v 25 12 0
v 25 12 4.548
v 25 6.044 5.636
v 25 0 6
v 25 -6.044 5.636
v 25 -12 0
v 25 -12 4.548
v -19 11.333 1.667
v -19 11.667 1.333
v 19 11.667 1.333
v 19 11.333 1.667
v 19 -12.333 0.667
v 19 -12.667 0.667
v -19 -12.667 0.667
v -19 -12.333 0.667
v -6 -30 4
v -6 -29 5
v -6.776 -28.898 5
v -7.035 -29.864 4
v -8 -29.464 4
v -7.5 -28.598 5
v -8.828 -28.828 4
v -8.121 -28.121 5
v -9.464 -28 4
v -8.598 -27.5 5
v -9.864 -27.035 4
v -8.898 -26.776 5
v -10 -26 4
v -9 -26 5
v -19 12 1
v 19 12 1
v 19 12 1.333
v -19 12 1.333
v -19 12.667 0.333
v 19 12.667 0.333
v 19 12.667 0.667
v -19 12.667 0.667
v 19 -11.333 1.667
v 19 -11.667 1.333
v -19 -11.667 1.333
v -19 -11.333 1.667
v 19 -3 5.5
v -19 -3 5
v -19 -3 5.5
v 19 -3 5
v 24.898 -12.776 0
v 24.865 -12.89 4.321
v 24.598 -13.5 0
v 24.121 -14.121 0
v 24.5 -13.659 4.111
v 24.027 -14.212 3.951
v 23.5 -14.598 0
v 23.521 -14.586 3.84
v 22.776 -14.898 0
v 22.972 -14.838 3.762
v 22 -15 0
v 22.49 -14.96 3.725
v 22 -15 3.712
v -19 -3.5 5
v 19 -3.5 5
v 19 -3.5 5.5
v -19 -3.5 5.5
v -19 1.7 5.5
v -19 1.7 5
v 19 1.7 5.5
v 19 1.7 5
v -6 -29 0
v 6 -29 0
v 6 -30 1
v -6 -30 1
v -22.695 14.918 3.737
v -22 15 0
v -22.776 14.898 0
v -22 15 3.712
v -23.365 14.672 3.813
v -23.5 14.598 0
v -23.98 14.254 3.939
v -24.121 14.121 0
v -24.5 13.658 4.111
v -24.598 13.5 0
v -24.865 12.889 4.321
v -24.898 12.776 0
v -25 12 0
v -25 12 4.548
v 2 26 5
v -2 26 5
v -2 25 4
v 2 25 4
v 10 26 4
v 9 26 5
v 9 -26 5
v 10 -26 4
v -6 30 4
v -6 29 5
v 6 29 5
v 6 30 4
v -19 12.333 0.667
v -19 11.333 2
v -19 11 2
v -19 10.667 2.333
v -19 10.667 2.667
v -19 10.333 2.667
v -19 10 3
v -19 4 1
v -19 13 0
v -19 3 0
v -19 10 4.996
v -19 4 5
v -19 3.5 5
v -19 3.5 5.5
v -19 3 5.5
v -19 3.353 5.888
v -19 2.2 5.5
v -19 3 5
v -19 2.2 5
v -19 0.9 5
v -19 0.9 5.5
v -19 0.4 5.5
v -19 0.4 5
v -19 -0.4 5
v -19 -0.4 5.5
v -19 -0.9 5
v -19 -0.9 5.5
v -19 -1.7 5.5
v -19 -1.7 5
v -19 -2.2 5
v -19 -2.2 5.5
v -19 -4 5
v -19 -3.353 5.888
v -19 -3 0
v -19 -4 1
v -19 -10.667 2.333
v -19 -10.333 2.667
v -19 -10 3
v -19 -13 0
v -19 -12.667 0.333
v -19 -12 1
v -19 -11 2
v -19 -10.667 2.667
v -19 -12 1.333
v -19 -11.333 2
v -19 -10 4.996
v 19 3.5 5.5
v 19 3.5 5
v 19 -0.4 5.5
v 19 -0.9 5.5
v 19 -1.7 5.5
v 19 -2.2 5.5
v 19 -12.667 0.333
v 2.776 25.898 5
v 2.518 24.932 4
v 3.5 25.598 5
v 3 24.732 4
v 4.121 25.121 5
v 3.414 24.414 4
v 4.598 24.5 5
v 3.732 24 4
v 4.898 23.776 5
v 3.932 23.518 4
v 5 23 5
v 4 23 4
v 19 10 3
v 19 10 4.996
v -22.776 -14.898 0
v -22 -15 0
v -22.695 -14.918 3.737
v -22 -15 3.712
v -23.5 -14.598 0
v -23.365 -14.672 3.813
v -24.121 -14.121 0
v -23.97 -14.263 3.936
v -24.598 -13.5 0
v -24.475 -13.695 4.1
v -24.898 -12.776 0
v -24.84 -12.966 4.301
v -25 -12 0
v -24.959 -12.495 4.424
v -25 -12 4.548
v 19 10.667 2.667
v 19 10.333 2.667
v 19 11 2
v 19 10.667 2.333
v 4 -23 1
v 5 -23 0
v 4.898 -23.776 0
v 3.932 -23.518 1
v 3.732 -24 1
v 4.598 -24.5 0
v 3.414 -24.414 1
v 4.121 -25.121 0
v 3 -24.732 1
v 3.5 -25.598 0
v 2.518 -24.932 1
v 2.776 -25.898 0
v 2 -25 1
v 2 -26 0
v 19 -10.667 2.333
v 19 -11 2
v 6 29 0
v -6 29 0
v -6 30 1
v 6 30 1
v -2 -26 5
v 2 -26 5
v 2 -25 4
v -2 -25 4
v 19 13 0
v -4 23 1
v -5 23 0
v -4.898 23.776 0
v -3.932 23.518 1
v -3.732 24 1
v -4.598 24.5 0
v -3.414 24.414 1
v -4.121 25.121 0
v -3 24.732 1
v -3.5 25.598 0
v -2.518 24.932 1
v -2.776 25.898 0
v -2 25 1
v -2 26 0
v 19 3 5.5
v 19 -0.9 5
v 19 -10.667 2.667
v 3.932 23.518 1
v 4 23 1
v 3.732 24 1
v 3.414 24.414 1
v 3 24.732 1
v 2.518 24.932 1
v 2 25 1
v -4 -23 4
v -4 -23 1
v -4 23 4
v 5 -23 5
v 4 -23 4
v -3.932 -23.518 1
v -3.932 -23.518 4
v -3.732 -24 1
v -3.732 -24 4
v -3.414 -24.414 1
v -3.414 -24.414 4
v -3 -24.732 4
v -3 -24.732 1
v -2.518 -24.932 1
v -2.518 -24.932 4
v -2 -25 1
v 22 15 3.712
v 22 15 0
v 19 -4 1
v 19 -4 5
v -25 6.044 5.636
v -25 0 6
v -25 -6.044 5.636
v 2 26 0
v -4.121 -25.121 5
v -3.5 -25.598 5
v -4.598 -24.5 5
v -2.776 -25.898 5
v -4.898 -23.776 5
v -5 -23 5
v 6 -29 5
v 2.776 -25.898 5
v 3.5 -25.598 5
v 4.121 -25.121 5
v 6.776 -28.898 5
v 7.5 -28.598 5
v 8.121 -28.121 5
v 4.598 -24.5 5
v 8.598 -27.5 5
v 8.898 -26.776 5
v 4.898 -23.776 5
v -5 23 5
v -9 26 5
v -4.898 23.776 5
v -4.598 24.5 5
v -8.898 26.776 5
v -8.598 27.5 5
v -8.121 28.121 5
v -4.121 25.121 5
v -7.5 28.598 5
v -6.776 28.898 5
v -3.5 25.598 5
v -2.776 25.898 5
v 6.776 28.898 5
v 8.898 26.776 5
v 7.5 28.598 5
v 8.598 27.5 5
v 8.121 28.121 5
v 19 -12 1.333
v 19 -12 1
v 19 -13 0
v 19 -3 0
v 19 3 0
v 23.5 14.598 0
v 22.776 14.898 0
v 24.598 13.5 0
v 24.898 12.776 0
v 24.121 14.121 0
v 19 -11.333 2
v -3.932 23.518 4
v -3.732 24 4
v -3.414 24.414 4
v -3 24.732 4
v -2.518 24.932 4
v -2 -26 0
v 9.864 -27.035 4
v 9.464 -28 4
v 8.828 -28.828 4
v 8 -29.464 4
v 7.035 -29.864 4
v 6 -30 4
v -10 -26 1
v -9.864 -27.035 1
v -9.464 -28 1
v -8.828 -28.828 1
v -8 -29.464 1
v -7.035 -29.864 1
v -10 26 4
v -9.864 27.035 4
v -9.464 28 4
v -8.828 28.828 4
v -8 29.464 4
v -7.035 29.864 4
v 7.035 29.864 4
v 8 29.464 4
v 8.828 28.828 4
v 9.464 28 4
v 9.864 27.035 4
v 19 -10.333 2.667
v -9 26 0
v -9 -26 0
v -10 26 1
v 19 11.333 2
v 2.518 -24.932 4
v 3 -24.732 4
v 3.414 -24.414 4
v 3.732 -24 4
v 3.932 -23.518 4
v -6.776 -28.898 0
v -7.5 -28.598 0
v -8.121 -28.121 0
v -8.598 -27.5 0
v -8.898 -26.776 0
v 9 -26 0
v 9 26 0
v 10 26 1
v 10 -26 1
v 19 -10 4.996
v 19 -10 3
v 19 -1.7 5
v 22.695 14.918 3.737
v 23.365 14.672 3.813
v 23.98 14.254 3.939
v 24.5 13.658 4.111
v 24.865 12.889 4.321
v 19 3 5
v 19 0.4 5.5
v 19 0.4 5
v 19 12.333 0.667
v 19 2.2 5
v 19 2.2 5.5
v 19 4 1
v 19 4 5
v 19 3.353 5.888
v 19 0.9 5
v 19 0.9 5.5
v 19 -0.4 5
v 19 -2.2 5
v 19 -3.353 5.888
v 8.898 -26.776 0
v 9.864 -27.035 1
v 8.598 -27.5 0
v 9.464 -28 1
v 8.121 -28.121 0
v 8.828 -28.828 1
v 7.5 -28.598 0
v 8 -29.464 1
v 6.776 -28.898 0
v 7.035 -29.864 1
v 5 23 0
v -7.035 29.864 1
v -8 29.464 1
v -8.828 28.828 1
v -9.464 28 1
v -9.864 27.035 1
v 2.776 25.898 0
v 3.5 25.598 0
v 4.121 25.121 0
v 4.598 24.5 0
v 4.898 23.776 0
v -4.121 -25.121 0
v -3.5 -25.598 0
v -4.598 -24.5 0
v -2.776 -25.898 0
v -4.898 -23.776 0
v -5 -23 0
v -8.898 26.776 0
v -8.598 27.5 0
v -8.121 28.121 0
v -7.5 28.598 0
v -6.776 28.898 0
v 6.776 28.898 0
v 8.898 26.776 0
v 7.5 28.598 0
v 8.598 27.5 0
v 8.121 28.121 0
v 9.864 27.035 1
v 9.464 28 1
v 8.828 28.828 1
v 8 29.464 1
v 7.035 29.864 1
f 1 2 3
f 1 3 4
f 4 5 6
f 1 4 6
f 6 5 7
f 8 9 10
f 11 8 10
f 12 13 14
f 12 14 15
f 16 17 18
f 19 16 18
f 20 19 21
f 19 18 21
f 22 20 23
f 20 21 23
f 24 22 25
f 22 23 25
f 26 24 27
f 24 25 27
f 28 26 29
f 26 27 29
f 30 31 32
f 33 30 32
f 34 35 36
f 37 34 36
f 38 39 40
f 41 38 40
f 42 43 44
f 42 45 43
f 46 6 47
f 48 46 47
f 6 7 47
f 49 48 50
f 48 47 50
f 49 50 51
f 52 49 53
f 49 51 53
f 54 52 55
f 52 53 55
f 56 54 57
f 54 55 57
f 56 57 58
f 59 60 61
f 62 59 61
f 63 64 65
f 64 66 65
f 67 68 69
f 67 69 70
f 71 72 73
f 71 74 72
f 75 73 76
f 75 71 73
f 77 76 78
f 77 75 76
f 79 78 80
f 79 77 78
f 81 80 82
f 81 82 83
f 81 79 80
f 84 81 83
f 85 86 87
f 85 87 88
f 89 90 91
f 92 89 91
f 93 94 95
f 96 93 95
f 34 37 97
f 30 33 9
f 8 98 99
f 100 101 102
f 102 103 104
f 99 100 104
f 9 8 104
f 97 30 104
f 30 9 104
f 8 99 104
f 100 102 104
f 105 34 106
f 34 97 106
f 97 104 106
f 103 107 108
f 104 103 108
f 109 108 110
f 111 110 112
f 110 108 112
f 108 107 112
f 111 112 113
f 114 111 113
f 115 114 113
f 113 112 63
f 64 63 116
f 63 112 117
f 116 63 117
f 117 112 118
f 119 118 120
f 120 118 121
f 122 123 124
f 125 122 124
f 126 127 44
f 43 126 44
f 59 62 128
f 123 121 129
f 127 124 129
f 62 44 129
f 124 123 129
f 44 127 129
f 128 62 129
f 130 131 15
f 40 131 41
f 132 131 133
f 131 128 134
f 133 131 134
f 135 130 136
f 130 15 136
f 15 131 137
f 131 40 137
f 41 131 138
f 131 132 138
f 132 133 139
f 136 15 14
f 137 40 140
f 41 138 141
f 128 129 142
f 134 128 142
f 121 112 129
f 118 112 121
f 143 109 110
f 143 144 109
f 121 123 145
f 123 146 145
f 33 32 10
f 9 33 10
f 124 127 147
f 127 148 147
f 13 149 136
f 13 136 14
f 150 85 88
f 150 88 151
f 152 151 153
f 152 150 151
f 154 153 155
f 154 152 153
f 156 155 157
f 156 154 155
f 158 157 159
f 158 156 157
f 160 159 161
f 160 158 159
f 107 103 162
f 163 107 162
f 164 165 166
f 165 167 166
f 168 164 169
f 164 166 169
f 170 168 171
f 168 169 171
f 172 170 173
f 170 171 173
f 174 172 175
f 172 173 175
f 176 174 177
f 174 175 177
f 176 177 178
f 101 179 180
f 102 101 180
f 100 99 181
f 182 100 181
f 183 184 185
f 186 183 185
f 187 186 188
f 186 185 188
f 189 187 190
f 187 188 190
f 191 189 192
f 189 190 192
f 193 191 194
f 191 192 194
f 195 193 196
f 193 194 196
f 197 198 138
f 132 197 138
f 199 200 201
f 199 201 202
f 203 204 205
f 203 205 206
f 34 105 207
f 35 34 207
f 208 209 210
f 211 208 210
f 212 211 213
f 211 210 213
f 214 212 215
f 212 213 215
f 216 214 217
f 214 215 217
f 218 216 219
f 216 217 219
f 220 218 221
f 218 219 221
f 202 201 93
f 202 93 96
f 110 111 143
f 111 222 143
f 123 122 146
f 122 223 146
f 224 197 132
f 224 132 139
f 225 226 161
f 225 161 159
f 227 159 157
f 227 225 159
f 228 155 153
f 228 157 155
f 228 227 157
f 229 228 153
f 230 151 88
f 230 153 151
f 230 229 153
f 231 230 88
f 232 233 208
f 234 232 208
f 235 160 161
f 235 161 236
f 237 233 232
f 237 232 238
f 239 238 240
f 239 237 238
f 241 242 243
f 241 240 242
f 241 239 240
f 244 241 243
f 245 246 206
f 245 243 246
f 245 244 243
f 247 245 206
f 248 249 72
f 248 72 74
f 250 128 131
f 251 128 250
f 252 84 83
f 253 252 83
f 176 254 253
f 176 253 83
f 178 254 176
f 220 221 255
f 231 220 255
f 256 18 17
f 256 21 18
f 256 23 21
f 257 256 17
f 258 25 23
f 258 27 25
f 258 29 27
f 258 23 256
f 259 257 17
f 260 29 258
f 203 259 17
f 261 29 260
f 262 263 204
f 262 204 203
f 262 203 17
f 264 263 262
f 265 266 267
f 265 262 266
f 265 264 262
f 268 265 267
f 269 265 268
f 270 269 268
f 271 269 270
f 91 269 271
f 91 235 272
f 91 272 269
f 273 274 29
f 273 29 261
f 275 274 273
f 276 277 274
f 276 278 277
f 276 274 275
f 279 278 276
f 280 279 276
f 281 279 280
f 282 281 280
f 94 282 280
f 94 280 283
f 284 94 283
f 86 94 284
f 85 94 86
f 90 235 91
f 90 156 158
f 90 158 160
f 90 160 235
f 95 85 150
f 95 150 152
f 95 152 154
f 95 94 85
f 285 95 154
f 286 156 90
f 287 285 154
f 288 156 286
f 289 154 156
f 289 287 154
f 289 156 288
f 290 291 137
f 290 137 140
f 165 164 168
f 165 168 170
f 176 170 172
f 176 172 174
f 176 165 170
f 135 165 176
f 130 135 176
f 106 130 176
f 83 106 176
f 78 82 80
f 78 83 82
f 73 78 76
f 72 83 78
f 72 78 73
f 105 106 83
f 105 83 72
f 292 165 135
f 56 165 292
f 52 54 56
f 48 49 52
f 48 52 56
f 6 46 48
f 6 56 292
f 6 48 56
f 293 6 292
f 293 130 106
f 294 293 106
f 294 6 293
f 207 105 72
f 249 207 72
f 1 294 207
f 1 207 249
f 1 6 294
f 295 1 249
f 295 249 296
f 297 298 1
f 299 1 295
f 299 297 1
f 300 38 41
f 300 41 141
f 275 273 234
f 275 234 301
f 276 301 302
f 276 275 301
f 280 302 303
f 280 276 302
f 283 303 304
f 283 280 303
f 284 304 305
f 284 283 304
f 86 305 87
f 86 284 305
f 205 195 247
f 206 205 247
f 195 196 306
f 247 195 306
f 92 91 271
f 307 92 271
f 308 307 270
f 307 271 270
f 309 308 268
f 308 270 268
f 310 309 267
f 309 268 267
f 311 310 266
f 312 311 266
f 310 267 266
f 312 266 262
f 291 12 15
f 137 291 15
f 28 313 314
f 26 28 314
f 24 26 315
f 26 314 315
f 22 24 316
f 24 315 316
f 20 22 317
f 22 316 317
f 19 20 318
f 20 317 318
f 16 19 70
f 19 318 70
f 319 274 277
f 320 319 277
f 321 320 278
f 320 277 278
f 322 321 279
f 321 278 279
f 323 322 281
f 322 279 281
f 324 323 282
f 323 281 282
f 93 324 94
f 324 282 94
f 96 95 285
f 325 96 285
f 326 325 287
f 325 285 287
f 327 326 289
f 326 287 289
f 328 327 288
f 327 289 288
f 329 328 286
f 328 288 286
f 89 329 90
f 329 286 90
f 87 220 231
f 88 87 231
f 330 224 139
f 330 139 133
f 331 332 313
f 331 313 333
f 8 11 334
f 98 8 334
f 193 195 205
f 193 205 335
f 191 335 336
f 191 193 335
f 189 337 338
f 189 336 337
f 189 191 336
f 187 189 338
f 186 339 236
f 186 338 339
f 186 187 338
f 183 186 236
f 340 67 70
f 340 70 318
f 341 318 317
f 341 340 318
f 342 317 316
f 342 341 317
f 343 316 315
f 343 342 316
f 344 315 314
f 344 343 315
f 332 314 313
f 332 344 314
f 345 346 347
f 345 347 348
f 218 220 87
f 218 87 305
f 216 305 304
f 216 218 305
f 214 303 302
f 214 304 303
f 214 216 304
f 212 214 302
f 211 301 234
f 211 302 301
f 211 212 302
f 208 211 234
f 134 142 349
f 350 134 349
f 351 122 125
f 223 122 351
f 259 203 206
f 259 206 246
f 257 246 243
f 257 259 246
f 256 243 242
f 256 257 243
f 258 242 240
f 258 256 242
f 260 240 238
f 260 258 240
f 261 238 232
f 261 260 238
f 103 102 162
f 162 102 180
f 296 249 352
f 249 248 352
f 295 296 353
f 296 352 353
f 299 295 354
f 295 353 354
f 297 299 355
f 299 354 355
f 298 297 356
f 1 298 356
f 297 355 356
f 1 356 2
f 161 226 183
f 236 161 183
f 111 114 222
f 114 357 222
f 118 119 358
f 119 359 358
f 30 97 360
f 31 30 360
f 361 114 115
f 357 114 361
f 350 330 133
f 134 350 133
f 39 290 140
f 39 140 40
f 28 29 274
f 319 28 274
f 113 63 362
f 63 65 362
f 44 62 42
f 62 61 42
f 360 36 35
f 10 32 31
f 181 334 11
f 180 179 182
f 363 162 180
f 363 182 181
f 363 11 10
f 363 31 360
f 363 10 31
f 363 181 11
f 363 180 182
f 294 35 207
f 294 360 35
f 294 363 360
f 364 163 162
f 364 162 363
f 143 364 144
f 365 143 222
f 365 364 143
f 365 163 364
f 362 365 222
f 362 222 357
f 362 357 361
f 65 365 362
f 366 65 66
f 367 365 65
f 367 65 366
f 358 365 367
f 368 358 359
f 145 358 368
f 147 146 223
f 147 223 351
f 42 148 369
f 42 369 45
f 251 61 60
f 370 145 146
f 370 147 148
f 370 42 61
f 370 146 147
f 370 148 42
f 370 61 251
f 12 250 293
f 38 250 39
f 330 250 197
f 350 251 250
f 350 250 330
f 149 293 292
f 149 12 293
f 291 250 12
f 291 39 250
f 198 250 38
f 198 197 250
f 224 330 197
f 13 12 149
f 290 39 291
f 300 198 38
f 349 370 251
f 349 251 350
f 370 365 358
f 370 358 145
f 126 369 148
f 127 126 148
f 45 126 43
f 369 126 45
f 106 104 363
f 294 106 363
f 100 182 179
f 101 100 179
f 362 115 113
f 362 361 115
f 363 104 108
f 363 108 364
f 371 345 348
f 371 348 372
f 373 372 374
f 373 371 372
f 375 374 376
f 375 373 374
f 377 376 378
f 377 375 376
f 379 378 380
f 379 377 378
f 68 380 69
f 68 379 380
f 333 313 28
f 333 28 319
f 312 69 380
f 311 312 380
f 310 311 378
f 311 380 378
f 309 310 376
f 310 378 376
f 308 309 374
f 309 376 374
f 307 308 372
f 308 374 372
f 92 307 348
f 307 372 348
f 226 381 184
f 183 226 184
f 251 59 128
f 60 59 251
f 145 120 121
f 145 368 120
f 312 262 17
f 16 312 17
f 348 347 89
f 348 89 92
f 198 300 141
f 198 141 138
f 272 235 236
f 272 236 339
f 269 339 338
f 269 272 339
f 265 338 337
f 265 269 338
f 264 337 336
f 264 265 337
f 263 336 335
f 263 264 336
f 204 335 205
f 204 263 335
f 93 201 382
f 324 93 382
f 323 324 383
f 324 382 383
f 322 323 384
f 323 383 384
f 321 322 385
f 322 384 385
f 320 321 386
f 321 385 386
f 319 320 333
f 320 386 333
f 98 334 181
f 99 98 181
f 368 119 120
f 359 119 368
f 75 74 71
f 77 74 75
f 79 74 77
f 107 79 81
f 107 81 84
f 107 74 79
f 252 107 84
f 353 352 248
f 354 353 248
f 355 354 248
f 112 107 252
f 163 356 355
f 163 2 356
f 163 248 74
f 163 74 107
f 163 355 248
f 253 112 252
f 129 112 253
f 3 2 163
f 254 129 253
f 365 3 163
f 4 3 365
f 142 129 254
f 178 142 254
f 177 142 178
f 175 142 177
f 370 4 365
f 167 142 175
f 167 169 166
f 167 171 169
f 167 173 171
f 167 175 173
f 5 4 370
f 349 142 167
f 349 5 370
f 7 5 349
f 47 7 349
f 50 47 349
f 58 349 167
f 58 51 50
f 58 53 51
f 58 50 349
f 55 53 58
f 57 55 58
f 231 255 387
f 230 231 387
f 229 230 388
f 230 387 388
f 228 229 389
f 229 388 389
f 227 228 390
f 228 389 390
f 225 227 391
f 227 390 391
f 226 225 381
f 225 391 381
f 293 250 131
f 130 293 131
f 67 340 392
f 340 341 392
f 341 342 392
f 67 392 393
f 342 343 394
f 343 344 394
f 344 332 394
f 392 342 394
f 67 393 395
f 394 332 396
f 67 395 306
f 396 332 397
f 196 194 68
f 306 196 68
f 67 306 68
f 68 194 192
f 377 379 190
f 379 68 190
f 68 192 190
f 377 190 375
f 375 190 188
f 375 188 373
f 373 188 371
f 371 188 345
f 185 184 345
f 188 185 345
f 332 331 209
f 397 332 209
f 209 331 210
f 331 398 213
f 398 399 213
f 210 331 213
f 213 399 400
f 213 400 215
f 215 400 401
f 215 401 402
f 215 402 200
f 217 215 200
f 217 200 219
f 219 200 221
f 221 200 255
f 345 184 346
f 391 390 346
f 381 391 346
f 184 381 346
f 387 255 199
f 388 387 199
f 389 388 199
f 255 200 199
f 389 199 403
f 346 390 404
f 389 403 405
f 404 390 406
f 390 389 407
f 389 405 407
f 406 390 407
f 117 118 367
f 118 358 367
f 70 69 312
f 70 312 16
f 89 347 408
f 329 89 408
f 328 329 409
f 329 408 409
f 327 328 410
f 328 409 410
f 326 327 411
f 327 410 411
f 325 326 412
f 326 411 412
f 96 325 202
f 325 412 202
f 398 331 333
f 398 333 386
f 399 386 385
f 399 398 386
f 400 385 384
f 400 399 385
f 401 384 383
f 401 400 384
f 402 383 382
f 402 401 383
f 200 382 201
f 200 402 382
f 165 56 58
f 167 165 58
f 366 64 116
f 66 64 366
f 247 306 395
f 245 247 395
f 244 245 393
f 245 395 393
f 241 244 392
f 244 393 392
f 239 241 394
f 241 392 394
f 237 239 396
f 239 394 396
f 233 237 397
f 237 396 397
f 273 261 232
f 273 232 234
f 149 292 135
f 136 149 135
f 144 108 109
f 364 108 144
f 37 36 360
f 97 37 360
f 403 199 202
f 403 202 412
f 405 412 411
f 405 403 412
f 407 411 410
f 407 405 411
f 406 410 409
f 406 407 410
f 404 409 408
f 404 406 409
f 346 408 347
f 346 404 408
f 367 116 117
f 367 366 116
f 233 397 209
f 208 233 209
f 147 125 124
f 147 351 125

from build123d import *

# Parameters (mm, degrees)
PAD_DEPTH           = 25
SKETCH001_W         = 38
SKETCH001_H         = 6
POCKET_DEPTH        = 117.235807
POCKET_DEPTH_BACK   = 123.235807
SKETCH002_W         = 38
SKETCH002_H         = 8
POCKET001_DEPTH     = 1
SKETCH003_W         = 0.5
SKETCH003_H         = 0.5
PAD001_DEPTH        = 19
PAD002_DEPTH        = 19
LINEARPATTERN_COUNT = 6
LINEARPATTERN_PITCH = 1.3
FILLET_R            = 3
CHAMFER_SIZE        = 3
POCKET002_DEPTH     = 38
CHAMFER001_SIZE     = 1
PAD003_DEPTH        = 5
CHAMFER002_SIZE     = 1


with BuildPart() as body:
    # Sketch → Pad (new body, symmetric)
    with BuildSketch(Plane.YZ):
        with BuildLine():
            Line((-15, 0), (-15, 3.712086))
            ThreePointArc((15, 3.712086), (0, 6), (-15, 3.712086))
            Line((15, 0), (15, 3.712086))
            Line((-15, 0), (15, 0))
        make_face()
    extrude(amount=PAD_DEPTH, both=True)

    # Sketch001 → Pocket (cut, two sides)
    with BuildSketch(Plane.XY) as pocket_sk:
        with Locations((0, 7)):
            Rectangle(SKETCH001_W, SKETCH001_H)
    pocket = extrude(amount=-POCKET_DEPTH, mode=Mode.SUBTRACT) + extrude(pocket_sk.sketch, amount=POCKET_DEPTH_BACK, mode=Mode.SUBTRACT)

    # Mirrored: Pocket across Sketch001 H_Axis
    add(pocket.mirror(Plane.ZX), mode=Mode.SUBTRACT)

    # Sketch002 → Pocket001 (cut)
    with BuildSketch(Plane.XY.offset(6)):
        Rectangle(SKETCH002_W, SKETCH002_H)
    extrude(amount=-POCKET001_DEPTH, mode=Mode.SUBTRACT)

    # Sketch003 → Pad001 (join)
    with BuildSketch(Plane.YZ):
        with Locations((-3.25, 5.25)):
            Rectangle(SKETCH003_W, SKETCH003_H)
    pad001 = extrude(amount=PAD001_DEPTH)

    # Sketch003 → Pad002 (join)
    with BuildSketch(Plane.YZ):
        with Locations((-3.25, 5.25)):
            Rectangle(SKETCH003_W, SKETCH003_H)
    pad002 = extrude(amount=-PAD002_DEPTH)

    # LinearPattern: Pad001, Pad002 ×6
    with Locations(*[(0, i * LINEARPATTERN_PITCH, 0) for i in range(1, LINEARPATTERN_COUNT)]):
        add(pad001)
        add(pad002)

    # Fillet
    fillet_edges = [body.edges().sort_by_distance(p)[0] for p in [
        (25, 15, 1.856043),
        (25, -15, 1.856043),
        (-25, 15, 1.856043),
        (-25, -15, 1.856043),
    ]]
    fillet(fillet_edges, radius=FILLET_R)

    # Chamfer
    chamfer_edges = [body.edges().sort_by_distance(p)[0] for p in [
        (0, -10, 0),
        (0, 10, 0),
    ]]
    chamfer(chamfer_edges, length=CHAMFER_SIZE)

    # Sketch004 (on Edge57 of Chamfer) → Pocket002 (cut)
    with BuildSketch(Plane(origin=(19, -13, 0), x_dir=(0, -0.707107, -0.707107), z_dir=(-1, 0, 0))):
        Polygon((-0.471405, 0), (-0.707107, 0.235702), (-0.942809, 0), align=None)
        Polygon((-1.414214, 0), (-1.649916, 0.235702), (-1.885618, 0), align=None)
        Polygon((-2.357023, 0), (-2.592725, 0.235702), (-2.828427, 0), align=None)
        Polygon((-3.299832, 0), (-3.535534, 0.235702), (-3.771236, 0), align=None)
    pocket002 = extrude(amount=POCKET002_DEPTH, mode=Mode.SUBTRACT)

    # Mirrored001: Pocket002 across XZ
    add(pocket002.mirror(Plane.XZ), mode=Mode.SUBTRACT)

    # Chamfer001
    chamfer001_edges = [body.edges().sort_by_distance(p)[0] for p in [
        (0, -4, 0),
        (0, 4, 0),
    ]]
    chamfer(chamfer001_edges, length=CHAMFER001_SIZE)


with BuildPart() as body001:
    # Sketch005 → Pad003 (new body)
    with BuildSketch(Plane.XY):
        with BuildLine():
            ThreePointArc((-6, 30), (-8.828427, 28.828427), (-10, 26))
            Line((-10, -26), (-10, 26))
            ThreePointArc((-10, -26), (-8.828427, -28.828427), (-6, -30))
            Line((6, -30), (-6, -30))
            ThreePointArc((6, -30), (8.828427, -28.828427), (10, -26))
            Line((10, 26), (10, -26))
            ThreePointArc((10, 26), (8.828427, 28.828427), (6, 30))
            Line((-6, 30), (6, 30))
        make_face()
        with BuildLine():
            ThreePointArc((-2, 25), (-3.414214, 24.414214), (-4, 23))
            Line((-4, -23), (-4, 23))
            ThreePointArc((-4, -23), (-3.414214, -24.414214), (-2, -25))
            Line((2, -25), (-2, -25))
            ThreePointArc((2, -25), (3.414214, -24.414214), (4, -23))
            Line((4, 23), (4, -23))
            ThreePointArc((4, 23), (3.414214, 24.414214), (2, 25))
            Line((-2, 25), (2, 25))
        make_face(mode=Mode.SUBTRACT)
    extrude(amount=PAD003_DEPTH)

    # Chamfer002
    chamfer002_edges = [body001.edges().sort_by_distance(p)[0] for p in [
        (0, -30, 0),
        (0, -30, 5),
        (0, 25, 5),
        (0, 25, 0),
    ]]
    chamfer(chamfer002_edges, length=CHAMFER002_SIZE)


solid = Compound([body.part, body001.part])
